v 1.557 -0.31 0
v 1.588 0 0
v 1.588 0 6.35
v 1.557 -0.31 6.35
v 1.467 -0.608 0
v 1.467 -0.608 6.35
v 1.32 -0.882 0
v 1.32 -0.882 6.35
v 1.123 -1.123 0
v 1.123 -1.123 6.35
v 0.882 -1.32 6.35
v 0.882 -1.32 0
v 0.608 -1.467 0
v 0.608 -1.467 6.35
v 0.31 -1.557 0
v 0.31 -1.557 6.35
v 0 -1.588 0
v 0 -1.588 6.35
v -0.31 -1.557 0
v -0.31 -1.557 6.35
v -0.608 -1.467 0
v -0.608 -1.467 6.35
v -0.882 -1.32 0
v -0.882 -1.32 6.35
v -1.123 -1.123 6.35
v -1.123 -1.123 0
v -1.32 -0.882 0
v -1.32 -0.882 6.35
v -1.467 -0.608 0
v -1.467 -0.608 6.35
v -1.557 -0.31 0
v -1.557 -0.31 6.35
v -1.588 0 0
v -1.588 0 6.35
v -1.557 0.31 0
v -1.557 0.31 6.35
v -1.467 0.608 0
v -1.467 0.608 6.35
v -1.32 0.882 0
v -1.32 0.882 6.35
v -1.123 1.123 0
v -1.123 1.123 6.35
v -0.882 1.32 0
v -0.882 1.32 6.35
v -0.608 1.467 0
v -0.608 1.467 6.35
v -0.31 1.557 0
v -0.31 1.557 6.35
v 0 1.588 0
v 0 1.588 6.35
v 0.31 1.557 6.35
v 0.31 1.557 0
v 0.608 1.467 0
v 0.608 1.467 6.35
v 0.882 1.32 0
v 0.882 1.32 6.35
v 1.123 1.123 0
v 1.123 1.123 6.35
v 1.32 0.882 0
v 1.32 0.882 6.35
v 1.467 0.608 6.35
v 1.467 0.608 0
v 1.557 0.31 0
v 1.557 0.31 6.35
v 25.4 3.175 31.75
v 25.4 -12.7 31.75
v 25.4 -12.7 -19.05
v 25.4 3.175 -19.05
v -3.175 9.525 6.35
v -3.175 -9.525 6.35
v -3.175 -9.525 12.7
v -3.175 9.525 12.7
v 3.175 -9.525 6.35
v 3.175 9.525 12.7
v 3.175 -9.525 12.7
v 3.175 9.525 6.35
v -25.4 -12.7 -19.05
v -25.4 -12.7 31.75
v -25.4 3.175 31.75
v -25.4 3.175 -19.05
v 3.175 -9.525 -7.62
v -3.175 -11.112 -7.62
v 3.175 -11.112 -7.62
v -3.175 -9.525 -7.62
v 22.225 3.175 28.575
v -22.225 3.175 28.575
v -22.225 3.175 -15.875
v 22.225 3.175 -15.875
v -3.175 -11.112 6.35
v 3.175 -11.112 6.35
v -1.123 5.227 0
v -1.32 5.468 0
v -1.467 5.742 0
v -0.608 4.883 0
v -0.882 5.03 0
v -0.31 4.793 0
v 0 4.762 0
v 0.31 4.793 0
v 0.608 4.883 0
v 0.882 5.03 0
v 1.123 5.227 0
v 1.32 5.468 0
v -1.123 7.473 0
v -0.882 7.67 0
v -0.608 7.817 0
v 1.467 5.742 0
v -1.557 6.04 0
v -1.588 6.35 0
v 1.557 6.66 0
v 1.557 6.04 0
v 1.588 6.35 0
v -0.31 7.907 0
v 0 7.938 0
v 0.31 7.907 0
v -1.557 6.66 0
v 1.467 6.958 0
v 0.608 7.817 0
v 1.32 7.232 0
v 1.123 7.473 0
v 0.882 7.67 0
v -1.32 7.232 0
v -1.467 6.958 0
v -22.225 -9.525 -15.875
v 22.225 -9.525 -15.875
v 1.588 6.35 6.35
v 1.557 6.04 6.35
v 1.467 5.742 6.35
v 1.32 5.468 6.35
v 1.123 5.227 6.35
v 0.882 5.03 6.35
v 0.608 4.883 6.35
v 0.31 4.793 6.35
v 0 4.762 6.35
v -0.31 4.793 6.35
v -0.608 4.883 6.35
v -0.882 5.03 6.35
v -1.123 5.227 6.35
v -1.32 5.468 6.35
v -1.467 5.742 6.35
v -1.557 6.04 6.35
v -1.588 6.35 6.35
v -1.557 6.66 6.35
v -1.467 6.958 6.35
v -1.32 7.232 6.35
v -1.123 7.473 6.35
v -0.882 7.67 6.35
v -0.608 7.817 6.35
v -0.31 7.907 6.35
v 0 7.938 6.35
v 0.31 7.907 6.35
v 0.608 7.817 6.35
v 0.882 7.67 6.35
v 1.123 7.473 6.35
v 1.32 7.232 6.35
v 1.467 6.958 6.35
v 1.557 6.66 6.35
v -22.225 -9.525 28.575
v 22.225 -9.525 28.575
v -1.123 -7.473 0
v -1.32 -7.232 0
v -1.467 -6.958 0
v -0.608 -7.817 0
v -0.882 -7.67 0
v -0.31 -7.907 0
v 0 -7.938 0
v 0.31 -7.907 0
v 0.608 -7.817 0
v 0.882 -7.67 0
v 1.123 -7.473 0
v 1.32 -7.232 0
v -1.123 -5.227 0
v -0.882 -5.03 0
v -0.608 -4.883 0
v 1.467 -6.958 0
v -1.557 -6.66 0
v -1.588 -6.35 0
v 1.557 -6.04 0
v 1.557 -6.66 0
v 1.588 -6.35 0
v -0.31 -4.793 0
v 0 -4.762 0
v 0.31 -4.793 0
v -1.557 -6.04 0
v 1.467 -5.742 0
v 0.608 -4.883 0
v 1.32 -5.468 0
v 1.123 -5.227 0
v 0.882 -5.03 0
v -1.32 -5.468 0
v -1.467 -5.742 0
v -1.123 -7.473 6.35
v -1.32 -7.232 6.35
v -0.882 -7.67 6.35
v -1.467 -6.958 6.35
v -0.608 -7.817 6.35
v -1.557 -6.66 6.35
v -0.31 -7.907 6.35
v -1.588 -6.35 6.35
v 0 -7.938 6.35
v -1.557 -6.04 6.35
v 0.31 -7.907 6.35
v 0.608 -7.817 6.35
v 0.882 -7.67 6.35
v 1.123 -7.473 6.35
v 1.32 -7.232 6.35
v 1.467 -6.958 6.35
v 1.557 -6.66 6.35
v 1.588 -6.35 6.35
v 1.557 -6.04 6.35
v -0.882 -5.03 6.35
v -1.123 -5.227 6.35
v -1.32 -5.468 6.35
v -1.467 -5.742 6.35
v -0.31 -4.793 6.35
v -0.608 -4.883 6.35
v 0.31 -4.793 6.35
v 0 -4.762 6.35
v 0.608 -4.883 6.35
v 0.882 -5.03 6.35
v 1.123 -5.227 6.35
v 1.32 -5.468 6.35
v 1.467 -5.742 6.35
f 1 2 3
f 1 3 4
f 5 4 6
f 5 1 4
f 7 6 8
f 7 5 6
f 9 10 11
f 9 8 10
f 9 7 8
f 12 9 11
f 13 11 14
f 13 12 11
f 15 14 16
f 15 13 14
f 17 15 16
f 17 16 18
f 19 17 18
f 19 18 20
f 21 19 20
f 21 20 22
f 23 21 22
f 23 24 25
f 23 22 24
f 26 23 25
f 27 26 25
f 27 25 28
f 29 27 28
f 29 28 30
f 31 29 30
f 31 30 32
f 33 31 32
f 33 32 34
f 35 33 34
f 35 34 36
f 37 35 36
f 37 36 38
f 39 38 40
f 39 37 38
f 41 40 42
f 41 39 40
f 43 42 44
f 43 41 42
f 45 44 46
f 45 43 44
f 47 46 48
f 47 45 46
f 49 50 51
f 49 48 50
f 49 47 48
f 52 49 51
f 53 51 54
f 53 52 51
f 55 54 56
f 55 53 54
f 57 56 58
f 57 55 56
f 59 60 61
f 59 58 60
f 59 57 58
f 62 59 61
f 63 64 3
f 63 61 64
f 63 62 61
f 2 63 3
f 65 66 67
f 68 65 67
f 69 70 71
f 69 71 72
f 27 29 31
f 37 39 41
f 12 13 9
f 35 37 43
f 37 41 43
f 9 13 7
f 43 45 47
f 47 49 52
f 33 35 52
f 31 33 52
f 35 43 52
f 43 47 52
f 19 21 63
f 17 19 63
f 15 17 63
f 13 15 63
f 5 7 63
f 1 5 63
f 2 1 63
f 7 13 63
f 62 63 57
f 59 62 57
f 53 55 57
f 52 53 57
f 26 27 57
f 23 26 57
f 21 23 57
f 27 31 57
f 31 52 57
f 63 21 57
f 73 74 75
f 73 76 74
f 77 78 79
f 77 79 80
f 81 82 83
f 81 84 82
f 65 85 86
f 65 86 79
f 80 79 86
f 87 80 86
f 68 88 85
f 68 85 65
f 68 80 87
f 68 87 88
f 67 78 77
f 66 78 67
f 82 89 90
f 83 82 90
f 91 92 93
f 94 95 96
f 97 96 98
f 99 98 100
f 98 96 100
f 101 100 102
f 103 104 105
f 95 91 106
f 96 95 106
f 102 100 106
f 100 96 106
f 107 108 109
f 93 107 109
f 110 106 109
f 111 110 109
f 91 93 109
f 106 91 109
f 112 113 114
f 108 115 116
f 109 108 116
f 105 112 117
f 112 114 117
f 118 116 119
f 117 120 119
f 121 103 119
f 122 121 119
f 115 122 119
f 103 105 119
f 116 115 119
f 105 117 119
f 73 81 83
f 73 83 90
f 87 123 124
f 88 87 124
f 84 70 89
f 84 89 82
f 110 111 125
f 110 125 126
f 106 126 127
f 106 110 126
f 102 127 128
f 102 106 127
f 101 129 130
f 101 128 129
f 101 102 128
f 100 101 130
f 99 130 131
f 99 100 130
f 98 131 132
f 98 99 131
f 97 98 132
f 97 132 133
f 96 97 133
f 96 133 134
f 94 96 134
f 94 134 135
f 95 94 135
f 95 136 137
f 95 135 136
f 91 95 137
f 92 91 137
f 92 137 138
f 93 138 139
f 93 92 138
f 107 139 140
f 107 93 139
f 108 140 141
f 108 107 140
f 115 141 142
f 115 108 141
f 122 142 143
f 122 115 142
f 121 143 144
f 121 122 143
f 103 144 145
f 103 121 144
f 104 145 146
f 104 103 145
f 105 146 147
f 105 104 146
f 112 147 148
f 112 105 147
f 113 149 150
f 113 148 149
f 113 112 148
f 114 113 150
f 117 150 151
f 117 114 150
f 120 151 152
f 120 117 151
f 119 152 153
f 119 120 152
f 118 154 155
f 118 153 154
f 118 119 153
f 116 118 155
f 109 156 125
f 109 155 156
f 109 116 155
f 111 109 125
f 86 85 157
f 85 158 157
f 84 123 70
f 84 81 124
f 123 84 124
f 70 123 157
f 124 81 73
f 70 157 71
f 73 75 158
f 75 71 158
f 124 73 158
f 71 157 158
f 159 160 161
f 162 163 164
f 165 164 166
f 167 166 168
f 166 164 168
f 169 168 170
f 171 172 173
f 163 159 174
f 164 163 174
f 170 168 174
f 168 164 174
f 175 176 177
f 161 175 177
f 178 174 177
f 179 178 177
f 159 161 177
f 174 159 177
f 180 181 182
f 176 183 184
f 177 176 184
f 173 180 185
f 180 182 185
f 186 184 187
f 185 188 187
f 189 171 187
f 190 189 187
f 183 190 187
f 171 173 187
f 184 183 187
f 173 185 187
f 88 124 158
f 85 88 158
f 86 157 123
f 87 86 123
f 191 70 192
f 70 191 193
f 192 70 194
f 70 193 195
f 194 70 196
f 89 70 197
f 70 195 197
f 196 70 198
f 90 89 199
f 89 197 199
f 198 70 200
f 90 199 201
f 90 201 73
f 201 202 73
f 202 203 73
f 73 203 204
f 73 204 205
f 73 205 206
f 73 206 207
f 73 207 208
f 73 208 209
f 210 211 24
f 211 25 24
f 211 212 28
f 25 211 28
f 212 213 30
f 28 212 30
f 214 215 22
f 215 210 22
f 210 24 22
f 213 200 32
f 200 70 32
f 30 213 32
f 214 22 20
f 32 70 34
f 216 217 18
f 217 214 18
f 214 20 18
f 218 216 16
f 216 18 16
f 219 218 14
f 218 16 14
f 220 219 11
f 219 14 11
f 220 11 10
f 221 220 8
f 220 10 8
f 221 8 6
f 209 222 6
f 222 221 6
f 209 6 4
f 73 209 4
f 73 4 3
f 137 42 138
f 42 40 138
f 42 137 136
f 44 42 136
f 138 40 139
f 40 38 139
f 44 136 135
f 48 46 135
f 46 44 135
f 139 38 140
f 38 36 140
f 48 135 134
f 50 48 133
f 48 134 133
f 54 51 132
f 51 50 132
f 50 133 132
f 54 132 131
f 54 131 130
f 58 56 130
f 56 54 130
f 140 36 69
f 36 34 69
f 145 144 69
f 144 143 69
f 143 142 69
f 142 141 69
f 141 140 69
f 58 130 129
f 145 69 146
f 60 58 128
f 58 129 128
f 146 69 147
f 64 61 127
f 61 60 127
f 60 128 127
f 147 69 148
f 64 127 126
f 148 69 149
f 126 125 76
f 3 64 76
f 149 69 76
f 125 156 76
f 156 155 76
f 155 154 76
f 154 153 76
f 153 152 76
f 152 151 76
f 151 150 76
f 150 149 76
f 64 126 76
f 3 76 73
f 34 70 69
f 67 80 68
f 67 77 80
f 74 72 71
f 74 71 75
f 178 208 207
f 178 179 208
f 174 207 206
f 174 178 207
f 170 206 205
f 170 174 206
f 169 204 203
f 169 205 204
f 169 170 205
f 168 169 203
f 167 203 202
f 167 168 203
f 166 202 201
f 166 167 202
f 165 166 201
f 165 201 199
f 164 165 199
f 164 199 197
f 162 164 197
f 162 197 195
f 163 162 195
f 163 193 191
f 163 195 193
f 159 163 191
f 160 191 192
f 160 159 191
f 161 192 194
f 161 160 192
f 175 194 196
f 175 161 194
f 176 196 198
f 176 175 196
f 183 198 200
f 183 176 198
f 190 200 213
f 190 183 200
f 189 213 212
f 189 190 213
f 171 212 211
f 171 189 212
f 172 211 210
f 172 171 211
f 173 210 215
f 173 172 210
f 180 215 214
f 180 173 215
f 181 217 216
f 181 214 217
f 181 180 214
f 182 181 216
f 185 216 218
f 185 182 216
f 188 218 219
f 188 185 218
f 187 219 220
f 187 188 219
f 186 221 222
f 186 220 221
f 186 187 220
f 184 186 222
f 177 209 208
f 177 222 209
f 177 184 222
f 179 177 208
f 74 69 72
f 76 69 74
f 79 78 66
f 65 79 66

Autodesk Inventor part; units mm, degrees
ref_plane "YZ Plane" through (0, 0, 0) normal (1, 0, 0) x (0, 1, 0)
ref_plane "XZ Plane" through (0, 0, 0) normal (0, 1, 0) x (-1, 0, 0)
ref_plane "XY Plane" through (0, 0, 0) normal (0, 0, 1) x (1, 0, 0)
sketch "Sketch1" plane through (0, 0, 0) normal (0, 0, 1) x (1, 0, 0)
  circle A0 centre (0, 6.35) radius 1.5875
  circle A1 centre (0, 0) radius 1.5875
  circle A2 centre (0, -6.35) radius 1.5875
  dimension "d0" = 3.175
  dimension "d1" = 6.35
  dimension "d2" = 6.35
extrude "Extrusion1" add sketch "Sketch1" along normal blind 6.35
sketch "Sketch2" plane through (0, 6.35, 6.35) normal (0, 0, 1) x (1, 0, 0)
  line L0 (-3.175, 3.175) -> (3.175, 3.175)
  line L1 (3.175, 3.175) -> (3.175, -15.875)
  line L2 (3.175, -15.875) -> (-3.175, -15.875)
  line L3 (-3.175, -15.875) -> (-3.175, 3.175)
  circle A0 centre (0, 0) radius 1.5875 projected
  circle A1 centre (0, -12.7) radius 1.5875 projected
  point P0 (0, -6.35)
  dimension "d5" = 6.35
  dimension "d7" = 3.175
  dimension "d8" = 3.175
  dimension "d11" = 3.175
extrude "Extrusion2" add sketch "Sketch2" along normal blind 6.35 contours L0 L1 L2 L3 | A0 | A1
sketch "Sketch3" plane through (-3.175, -9.525, 6.35) normal (0, -1, 0) x (1, 0, 0)
  line L0 (28.575, 25.4) -> (-22.225, 25.4)
  line L1 (-22.225, 25.4) -> (-22.225, -25.4)
  line L2 (-22.225, -25.4) -> (28.575, -25.4)
  line L3 (28.575, -25.4) -> (28.575, 25.4)
  line L4 (0, 0) -> (6.35, 0) projected
  line L5 (6.35, 0) -> (0, 0)
  line L6 (0, 0) -> (0, -13.97)
  line L7 (0, -13.97) -> (6.35, -13.97)
  line L8 (6.35, -13.97) -> (6.35, 0)
  point P0 (3.175, -6.35)
  dimension "d12" = 50.8
  dimension "d13" = 50.8
  dimension "d14" = 25.4
  dimension "d15" = 25.4
  dimension "d16" = 6.35
  dimension "d17" = 0
  dimension "d18" = 22.225
  dimension "d19" = 13.97
extrude "Extrusion3" add sketch "Sketch3" along normal blind 3.175
sketch "Sketch4" plane through (-3.175, -9.525, 6.35) normal (0, 1, 0) x (1, 0, 0)
  line L0 (-22.225, -25.4) -> (-22.225, 25.4) projected
  line L1 (-22.225, 25.4) -> (28.575, 25.4) projected
  line L2 (-22.225, -25.4) -> (28.575, -25.4)
  line L3 (28.575, -25.4) -> (28.575, 25.4)
  line L4 (28.575, 25.4) -> (-22.225, 25.4)
  line L5 (-22.225, 25.4) -> (-22.225, -25.4)
  line L6 (25.4, -22.225) -> (-19.05, -22.225)
  line L7 (-19.05, -22.225) -> (-19.05, 22.225)
  line L8 (-19.05, 22.225) -> (25.4, 22.225)
  line L9 (25.4, 22.225) -> (25.4, -22.225)
  point P0 (3.175, 6.35)
  dimension "d22" = 3.175
extrude "Extrusion4" add sketch "Sketch4" along normal blind 12.7
sketch "Sketch5" plane through (-3.175, -12.7, 6.35) normal (0, -1, 0) x (1, 0, 0)
  line L0 (6.35, 0) -> (6.35, -13.97) projected
  line L1 (0, -13.97) -> (0, 0) projected
  line L2 (6.35, 0) -> (0, 0)
  line L3 (0, 0) -> (0, -13.97)
  line L4 (0, -13.97) -> (6.35, -13.97)
  line L5 (6.35, -13.97) -> (6.35, 0)
  point P0 (3.175, -6.35)
extrude "Extrusion5" add sketch "Sketch5" against normal blind 1.5875
properties part number "Weight1"
